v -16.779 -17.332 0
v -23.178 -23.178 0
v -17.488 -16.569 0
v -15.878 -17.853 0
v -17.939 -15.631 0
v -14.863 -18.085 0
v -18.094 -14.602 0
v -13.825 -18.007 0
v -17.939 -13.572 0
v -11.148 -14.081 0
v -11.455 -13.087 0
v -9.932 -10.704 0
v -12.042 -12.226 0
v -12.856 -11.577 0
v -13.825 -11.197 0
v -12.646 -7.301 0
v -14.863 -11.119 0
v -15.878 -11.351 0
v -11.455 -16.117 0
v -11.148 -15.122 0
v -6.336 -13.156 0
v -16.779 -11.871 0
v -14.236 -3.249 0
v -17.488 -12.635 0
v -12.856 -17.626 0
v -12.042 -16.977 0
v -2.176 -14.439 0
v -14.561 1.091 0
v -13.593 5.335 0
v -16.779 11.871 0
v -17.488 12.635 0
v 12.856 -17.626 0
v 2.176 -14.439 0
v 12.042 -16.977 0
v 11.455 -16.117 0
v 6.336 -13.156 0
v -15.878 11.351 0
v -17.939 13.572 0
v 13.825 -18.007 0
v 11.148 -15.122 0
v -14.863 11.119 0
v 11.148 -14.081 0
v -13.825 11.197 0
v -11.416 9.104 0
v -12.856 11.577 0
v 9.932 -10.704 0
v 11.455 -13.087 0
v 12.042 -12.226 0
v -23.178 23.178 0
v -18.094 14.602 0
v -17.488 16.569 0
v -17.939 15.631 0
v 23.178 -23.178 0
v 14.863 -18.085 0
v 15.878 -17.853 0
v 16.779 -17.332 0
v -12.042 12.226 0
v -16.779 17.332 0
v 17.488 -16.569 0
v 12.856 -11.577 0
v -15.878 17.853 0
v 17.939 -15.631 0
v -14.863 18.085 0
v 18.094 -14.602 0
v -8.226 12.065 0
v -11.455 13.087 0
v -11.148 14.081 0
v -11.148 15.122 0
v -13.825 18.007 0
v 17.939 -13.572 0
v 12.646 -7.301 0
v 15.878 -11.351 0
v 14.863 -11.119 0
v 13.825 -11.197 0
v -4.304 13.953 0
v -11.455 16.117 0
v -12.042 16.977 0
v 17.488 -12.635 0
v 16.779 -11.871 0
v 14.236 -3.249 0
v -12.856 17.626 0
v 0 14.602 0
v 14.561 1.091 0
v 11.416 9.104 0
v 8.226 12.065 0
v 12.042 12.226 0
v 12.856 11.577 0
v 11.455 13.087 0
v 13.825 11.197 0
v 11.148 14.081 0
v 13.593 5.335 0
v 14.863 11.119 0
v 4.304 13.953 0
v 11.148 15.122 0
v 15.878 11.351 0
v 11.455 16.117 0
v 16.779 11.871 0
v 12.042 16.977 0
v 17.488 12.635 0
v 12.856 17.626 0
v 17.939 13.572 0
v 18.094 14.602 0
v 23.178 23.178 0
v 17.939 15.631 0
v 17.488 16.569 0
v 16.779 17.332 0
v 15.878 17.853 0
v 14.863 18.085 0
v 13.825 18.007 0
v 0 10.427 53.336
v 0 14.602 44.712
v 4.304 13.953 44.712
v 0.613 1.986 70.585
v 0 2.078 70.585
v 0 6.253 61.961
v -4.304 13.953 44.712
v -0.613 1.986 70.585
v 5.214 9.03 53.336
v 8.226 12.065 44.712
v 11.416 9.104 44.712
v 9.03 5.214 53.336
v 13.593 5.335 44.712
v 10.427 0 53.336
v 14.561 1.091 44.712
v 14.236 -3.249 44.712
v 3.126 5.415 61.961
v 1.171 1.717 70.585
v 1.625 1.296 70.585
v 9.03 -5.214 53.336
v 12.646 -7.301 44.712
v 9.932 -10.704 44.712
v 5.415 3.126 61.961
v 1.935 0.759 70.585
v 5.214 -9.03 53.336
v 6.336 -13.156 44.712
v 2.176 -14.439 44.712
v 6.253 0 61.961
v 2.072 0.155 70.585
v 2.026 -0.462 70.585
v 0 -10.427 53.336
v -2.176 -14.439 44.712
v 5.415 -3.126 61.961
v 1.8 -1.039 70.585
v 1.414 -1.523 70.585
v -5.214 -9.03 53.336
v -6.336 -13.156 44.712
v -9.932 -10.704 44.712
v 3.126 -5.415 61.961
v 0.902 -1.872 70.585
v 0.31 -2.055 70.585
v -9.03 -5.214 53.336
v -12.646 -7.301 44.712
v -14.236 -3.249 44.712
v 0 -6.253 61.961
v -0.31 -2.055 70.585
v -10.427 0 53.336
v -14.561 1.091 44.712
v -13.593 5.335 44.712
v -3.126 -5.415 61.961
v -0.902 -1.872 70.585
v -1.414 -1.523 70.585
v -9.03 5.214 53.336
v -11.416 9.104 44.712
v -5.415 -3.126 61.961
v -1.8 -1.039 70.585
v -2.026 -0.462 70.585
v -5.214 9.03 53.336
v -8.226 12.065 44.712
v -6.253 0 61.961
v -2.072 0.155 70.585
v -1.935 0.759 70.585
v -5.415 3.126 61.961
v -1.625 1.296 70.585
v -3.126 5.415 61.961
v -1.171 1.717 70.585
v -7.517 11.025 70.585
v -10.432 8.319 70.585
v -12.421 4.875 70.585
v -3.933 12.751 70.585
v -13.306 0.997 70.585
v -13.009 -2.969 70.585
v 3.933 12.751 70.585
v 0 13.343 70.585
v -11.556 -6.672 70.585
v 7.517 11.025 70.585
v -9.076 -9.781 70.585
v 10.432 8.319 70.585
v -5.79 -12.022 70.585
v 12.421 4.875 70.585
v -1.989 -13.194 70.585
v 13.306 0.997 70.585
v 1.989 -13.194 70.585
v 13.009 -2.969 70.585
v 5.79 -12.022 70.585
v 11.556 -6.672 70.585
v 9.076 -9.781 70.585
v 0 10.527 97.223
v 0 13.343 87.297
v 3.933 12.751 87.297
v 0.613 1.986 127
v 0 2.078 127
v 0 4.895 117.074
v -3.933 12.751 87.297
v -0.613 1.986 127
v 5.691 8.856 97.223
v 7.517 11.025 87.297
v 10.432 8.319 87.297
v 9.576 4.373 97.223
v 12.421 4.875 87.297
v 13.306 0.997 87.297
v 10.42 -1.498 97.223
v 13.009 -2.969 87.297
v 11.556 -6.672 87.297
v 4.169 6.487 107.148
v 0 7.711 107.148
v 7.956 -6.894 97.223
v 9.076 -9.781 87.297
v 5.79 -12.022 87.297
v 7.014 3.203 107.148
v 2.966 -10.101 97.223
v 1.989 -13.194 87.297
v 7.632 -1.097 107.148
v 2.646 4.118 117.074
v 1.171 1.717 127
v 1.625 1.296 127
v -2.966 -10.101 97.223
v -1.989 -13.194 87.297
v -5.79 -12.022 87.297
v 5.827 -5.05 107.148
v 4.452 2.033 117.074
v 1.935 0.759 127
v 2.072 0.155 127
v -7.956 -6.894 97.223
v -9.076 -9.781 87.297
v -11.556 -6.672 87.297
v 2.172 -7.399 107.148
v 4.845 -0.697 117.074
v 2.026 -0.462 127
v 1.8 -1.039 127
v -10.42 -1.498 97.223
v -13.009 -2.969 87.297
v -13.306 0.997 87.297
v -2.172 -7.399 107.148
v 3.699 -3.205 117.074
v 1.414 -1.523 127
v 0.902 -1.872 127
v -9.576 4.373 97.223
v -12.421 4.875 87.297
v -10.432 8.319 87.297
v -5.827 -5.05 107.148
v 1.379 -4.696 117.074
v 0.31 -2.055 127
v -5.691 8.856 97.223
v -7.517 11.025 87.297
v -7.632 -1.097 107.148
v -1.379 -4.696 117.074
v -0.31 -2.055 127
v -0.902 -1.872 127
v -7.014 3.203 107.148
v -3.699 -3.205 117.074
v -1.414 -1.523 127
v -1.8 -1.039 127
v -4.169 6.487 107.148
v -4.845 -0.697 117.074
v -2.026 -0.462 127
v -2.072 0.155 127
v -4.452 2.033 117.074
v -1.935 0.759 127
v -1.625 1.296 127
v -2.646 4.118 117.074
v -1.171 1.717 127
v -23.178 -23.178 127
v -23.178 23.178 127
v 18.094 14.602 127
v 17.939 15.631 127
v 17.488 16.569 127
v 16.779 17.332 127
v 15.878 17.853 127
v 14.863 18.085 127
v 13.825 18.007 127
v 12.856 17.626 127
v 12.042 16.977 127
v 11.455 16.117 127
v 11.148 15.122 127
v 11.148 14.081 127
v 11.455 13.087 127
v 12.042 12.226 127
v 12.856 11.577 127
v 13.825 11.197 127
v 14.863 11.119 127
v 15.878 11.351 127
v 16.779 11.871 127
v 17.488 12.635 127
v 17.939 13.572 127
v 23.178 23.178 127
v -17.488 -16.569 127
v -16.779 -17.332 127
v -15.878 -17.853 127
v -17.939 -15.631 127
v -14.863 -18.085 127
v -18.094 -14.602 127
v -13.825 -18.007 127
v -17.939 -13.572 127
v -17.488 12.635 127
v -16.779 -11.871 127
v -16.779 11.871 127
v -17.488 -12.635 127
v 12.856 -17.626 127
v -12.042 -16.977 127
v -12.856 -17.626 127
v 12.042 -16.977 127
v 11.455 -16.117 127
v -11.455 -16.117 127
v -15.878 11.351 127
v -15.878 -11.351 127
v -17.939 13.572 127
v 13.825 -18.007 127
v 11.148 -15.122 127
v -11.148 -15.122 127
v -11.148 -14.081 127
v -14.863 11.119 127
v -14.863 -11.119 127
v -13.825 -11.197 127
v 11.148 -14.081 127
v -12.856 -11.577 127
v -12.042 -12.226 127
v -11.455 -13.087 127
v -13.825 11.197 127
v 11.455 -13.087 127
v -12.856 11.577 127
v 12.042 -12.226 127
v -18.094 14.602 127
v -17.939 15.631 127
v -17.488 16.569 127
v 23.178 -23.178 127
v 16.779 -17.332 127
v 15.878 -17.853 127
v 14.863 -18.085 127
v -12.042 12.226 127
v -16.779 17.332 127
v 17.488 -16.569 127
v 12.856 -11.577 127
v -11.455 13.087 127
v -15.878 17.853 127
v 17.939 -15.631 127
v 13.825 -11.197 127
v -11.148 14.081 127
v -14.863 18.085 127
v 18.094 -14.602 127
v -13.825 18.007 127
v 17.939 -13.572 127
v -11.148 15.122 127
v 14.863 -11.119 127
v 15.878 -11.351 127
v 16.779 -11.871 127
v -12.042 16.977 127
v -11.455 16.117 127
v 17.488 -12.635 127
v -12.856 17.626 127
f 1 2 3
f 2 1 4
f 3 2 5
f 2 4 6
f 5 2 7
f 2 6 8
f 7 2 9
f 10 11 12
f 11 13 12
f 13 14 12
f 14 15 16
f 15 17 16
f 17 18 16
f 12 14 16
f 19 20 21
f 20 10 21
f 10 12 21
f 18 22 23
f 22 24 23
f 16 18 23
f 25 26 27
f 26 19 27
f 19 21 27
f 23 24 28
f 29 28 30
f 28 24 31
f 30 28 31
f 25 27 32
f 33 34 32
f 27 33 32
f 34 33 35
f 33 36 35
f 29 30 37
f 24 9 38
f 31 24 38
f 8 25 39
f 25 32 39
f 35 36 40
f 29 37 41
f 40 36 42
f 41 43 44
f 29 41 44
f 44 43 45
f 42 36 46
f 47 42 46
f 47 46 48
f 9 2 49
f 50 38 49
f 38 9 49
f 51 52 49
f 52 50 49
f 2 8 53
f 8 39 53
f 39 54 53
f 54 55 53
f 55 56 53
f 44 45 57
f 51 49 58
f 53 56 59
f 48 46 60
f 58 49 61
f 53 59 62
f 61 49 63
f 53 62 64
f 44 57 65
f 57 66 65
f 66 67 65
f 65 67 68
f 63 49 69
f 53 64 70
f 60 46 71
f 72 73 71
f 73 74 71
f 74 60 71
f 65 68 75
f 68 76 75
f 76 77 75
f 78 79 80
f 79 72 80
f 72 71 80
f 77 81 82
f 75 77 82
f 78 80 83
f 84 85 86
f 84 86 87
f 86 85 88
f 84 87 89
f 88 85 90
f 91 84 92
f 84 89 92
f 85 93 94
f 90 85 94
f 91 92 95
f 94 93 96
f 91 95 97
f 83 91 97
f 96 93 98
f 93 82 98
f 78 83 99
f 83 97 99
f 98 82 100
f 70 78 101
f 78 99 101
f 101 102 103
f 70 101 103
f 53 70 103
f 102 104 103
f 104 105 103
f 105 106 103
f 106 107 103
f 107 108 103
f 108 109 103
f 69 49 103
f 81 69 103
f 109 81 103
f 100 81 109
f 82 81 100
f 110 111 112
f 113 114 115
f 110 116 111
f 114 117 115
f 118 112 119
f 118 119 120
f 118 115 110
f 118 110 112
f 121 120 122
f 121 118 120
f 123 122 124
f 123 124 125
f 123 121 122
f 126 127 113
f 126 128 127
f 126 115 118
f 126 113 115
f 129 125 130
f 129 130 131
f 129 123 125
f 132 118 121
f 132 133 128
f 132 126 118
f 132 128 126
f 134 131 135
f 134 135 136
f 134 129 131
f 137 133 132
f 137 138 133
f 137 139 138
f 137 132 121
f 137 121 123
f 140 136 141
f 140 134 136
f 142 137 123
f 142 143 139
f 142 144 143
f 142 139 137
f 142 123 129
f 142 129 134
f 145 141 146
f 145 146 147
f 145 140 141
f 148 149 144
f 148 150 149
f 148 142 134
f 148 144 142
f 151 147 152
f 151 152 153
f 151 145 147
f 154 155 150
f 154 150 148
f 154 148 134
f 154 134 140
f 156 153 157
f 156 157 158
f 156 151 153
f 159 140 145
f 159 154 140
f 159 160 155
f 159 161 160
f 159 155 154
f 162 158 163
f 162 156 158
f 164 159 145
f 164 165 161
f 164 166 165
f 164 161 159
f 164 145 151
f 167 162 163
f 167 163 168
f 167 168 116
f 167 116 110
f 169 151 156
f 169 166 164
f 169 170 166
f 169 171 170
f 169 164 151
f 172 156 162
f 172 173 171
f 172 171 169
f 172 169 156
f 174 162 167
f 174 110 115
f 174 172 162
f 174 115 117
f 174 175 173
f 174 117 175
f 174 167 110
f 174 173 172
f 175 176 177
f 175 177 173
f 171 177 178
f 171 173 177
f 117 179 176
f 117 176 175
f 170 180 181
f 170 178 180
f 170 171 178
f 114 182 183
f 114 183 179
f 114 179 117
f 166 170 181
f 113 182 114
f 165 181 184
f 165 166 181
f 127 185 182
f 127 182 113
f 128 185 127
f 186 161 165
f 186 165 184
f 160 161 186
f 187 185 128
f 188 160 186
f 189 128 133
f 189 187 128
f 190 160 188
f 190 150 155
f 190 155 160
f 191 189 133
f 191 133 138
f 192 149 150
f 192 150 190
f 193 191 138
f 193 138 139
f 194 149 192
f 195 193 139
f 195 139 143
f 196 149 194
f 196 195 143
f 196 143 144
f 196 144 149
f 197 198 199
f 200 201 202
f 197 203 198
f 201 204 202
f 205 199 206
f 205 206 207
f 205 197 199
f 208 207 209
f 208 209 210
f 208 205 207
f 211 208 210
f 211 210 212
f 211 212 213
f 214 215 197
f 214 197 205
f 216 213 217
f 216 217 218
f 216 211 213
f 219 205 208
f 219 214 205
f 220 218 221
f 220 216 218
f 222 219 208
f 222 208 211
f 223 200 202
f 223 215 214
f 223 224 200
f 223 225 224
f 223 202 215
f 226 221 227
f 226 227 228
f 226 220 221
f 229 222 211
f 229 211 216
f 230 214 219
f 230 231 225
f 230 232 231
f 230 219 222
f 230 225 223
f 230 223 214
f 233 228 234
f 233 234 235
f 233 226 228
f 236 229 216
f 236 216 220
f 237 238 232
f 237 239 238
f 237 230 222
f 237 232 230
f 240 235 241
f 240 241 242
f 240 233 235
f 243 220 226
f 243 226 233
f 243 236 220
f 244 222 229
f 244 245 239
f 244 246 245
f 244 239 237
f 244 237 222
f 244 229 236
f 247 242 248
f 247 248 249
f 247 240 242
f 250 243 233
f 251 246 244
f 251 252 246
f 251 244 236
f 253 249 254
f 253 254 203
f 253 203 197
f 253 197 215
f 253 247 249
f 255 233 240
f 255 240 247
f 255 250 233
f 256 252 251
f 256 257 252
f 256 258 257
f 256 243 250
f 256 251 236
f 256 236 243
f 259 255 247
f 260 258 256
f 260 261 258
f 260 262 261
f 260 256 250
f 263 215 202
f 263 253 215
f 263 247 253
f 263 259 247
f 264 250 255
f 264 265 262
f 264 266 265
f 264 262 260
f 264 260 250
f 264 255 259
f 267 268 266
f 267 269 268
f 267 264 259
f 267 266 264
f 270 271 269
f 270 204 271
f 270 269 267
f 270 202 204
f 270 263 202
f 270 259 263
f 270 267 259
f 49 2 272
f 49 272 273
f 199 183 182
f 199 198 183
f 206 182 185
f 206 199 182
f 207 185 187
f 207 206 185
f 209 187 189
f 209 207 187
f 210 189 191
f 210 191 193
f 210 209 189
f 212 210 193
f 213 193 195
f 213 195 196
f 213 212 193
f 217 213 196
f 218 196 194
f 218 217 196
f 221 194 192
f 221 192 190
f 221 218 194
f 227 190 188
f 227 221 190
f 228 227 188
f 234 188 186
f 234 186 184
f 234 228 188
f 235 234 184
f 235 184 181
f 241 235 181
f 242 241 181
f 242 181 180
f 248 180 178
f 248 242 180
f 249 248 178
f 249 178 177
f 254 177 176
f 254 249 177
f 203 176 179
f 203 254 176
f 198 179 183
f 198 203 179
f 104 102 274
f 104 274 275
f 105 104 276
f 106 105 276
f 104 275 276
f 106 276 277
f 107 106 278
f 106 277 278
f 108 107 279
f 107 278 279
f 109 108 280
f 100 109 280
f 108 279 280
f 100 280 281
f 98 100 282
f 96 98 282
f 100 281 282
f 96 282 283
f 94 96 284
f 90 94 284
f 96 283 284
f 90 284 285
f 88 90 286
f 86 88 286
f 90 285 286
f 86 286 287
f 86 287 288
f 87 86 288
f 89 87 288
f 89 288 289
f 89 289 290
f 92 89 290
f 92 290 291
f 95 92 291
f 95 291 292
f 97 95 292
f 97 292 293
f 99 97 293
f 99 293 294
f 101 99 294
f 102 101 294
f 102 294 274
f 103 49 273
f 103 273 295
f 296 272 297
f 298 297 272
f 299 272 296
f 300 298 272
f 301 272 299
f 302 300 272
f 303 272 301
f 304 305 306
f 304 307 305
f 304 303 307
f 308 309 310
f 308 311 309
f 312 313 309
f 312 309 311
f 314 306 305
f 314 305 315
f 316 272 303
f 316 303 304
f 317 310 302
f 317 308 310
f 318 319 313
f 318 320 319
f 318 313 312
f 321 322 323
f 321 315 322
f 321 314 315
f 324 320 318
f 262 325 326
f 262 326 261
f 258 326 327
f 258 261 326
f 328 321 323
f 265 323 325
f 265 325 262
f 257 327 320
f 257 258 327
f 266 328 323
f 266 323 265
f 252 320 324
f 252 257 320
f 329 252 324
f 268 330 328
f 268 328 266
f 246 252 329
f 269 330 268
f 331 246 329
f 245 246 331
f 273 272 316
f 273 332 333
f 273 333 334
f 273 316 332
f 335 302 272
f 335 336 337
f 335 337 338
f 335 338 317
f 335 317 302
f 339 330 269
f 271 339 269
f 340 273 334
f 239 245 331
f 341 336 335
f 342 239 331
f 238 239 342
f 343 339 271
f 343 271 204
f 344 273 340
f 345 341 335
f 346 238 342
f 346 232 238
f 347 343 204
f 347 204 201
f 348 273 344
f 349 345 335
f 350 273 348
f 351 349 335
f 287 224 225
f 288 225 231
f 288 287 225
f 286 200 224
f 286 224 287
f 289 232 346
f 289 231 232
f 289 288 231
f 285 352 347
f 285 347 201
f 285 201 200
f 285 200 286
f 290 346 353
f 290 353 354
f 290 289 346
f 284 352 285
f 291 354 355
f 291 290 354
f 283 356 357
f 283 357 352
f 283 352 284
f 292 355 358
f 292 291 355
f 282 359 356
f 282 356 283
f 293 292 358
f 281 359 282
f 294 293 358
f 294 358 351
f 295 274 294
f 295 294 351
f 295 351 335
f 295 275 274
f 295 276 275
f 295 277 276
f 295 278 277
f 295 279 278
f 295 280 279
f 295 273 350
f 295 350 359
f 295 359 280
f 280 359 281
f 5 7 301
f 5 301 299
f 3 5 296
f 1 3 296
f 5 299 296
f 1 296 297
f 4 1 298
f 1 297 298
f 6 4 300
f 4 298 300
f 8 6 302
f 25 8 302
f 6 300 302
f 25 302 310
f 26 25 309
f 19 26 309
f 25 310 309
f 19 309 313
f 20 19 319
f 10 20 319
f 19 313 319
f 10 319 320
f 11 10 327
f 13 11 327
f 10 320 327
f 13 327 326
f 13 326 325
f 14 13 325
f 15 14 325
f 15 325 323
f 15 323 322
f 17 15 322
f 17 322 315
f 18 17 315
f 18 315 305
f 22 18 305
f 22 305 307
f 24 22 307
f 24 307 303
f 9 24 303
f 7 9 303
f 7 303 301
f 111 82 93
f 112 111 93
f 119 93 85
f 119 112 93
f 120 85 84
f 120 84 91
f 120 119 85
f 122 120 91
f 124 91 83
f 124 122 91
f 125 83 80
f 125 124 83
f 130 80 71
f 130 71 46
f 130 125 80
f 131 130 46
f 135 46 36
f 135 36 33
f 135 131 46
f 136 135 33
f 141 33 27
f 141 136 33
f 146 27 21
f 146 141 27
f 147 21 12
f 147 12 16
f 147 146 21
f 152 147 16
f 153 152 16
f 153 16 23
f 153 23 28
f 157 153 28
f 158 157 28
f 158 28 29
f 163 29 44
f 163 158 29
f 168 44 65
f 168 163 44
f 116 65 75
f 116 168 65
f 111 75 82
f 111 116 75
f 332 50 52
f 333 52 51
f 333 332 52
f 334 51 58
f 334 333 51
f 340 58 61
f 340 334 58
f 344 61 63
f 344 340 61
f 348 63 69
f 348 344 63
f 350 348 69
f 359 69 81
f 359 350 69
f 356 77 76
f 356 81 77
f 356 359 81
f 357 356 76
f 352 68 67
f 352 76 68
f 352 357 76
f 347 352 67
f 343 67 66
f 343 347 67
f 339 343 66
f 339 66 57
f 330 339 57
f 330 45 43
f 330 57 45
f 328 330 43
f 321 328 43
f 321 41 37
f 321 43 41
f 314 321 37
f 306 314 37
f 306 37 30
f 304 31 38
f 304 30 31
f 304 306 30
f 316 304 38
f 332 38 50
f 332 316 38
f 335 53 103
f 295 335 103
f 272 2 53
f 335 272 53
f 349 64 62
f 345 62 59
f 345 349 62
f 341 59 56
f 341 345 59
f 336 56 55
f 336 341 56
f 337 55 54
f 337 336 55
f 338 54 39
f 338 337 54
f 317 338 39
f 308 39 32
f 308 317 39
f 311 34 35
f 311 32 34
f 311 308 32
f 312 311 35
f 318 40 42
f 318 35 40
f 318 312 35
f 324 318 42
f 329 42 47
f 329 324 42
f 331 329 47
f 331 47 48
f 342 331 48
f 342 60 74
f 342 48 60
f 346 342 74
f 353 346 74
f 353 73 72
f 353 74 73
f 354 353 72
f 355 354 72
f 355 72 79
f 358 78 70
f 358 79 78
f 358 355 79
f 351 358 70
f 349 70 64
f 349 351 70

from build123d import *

# Parameters (mm, degrees)
SKETCH1_W               = 46.355
SKETCH1_H               = 46.355
BOSS_EXTRUDE1_DEPTH     = 127
SKETCH2_R               = 1.397
CUT_EXTRUDE1_DEPTH      = 128
SKETCH4_R               = 3.4925
CUT_EXTRUDE3_DEPTH      = 128
MIRROR2_COPY_1_SKETCH_R = 3.4925
MIRROR2_COPY_1_DEPTH    = 128


with BuildPart() as part:
    # Sketch1 → Boss-Extrude1 (new body)
    with BuildSketch(Plane.XY):
        Rectangle(SKETCH1_W, SKETCH1_H)
    extrude(amount=BOSS_EXTRUDE1_DEPTH)

    # Sketch2 → Cut-Extrude1 (cut, through all)
    with BuildSketch(Plane.XY.offset(127)):
        Circle(SKETCH2_R)
    extrude(amount=-CUT_EXTRUDE1_DEPTH, mode=Mode.SUBTRACT)

    # Sketch4 → Cut-Extrude3 (cut, through all)
    with BuildSketch(Plane.XY.offset(127)):
        with Locations((14.601896453, 14.601896453)):
            Circle(SKETCH4_R)
    cut_extrude3 = extrude(amount=-CUT_EXTRUDE3_DEPTH, mode=Mode.SUBTRACT)

    # Mirror1: Cut-Extrude3 across plane
    add(cut_extrude3.mirror(Plane.ZX), mode=Mode.SUBTRACT)

    # Mirror2: Cut-Extrude3 across plane
    add(cut_extrude3.mirror(Plane(origin=(0, 0, 0), x_dir=(0, 0, 1), z_dir=(1, 0, 0))), mode=Mode.SUBTRACT)

    # Mirror2 copy 1 sketch → Mirror2 copy 1 (cut, through all)
    with BuildSketch(Plane(origin=(0, 0, 127), x_dir=(-1, 0, 0), z_dir=(0, 0, 1))):
        with Locations((14.601896453, 14.601896453)):
            Circle(MIRROR2_COPY_1_SKETCH_R)
    extrude(amount=-MIRROR2_COPY_1_DEPTH, mode=Mode.SUBTRACT)

    # Sketch5 → Cut-Revolve1 (revolve, cut)
    with BuildSketch(Plane(origin=(0, 0, 0), x_dir=(0, 0, -1), z_dir=(1, 0, 0))):
        Polygon((0, 14.601896453), (-44.712215564, 14.601896453), (-70.584924633, 2.078286108), (-70.584924633, 13.343436946), (-87.296961591, 13.343436946), (-127, 2.078286108), (-127, 0), (0, 0), align=None)
    revolve(axis=Axis((0, 0, 127), (0, 0, -1)), mode=Mode.SUBTRACT)


solid = part.part
